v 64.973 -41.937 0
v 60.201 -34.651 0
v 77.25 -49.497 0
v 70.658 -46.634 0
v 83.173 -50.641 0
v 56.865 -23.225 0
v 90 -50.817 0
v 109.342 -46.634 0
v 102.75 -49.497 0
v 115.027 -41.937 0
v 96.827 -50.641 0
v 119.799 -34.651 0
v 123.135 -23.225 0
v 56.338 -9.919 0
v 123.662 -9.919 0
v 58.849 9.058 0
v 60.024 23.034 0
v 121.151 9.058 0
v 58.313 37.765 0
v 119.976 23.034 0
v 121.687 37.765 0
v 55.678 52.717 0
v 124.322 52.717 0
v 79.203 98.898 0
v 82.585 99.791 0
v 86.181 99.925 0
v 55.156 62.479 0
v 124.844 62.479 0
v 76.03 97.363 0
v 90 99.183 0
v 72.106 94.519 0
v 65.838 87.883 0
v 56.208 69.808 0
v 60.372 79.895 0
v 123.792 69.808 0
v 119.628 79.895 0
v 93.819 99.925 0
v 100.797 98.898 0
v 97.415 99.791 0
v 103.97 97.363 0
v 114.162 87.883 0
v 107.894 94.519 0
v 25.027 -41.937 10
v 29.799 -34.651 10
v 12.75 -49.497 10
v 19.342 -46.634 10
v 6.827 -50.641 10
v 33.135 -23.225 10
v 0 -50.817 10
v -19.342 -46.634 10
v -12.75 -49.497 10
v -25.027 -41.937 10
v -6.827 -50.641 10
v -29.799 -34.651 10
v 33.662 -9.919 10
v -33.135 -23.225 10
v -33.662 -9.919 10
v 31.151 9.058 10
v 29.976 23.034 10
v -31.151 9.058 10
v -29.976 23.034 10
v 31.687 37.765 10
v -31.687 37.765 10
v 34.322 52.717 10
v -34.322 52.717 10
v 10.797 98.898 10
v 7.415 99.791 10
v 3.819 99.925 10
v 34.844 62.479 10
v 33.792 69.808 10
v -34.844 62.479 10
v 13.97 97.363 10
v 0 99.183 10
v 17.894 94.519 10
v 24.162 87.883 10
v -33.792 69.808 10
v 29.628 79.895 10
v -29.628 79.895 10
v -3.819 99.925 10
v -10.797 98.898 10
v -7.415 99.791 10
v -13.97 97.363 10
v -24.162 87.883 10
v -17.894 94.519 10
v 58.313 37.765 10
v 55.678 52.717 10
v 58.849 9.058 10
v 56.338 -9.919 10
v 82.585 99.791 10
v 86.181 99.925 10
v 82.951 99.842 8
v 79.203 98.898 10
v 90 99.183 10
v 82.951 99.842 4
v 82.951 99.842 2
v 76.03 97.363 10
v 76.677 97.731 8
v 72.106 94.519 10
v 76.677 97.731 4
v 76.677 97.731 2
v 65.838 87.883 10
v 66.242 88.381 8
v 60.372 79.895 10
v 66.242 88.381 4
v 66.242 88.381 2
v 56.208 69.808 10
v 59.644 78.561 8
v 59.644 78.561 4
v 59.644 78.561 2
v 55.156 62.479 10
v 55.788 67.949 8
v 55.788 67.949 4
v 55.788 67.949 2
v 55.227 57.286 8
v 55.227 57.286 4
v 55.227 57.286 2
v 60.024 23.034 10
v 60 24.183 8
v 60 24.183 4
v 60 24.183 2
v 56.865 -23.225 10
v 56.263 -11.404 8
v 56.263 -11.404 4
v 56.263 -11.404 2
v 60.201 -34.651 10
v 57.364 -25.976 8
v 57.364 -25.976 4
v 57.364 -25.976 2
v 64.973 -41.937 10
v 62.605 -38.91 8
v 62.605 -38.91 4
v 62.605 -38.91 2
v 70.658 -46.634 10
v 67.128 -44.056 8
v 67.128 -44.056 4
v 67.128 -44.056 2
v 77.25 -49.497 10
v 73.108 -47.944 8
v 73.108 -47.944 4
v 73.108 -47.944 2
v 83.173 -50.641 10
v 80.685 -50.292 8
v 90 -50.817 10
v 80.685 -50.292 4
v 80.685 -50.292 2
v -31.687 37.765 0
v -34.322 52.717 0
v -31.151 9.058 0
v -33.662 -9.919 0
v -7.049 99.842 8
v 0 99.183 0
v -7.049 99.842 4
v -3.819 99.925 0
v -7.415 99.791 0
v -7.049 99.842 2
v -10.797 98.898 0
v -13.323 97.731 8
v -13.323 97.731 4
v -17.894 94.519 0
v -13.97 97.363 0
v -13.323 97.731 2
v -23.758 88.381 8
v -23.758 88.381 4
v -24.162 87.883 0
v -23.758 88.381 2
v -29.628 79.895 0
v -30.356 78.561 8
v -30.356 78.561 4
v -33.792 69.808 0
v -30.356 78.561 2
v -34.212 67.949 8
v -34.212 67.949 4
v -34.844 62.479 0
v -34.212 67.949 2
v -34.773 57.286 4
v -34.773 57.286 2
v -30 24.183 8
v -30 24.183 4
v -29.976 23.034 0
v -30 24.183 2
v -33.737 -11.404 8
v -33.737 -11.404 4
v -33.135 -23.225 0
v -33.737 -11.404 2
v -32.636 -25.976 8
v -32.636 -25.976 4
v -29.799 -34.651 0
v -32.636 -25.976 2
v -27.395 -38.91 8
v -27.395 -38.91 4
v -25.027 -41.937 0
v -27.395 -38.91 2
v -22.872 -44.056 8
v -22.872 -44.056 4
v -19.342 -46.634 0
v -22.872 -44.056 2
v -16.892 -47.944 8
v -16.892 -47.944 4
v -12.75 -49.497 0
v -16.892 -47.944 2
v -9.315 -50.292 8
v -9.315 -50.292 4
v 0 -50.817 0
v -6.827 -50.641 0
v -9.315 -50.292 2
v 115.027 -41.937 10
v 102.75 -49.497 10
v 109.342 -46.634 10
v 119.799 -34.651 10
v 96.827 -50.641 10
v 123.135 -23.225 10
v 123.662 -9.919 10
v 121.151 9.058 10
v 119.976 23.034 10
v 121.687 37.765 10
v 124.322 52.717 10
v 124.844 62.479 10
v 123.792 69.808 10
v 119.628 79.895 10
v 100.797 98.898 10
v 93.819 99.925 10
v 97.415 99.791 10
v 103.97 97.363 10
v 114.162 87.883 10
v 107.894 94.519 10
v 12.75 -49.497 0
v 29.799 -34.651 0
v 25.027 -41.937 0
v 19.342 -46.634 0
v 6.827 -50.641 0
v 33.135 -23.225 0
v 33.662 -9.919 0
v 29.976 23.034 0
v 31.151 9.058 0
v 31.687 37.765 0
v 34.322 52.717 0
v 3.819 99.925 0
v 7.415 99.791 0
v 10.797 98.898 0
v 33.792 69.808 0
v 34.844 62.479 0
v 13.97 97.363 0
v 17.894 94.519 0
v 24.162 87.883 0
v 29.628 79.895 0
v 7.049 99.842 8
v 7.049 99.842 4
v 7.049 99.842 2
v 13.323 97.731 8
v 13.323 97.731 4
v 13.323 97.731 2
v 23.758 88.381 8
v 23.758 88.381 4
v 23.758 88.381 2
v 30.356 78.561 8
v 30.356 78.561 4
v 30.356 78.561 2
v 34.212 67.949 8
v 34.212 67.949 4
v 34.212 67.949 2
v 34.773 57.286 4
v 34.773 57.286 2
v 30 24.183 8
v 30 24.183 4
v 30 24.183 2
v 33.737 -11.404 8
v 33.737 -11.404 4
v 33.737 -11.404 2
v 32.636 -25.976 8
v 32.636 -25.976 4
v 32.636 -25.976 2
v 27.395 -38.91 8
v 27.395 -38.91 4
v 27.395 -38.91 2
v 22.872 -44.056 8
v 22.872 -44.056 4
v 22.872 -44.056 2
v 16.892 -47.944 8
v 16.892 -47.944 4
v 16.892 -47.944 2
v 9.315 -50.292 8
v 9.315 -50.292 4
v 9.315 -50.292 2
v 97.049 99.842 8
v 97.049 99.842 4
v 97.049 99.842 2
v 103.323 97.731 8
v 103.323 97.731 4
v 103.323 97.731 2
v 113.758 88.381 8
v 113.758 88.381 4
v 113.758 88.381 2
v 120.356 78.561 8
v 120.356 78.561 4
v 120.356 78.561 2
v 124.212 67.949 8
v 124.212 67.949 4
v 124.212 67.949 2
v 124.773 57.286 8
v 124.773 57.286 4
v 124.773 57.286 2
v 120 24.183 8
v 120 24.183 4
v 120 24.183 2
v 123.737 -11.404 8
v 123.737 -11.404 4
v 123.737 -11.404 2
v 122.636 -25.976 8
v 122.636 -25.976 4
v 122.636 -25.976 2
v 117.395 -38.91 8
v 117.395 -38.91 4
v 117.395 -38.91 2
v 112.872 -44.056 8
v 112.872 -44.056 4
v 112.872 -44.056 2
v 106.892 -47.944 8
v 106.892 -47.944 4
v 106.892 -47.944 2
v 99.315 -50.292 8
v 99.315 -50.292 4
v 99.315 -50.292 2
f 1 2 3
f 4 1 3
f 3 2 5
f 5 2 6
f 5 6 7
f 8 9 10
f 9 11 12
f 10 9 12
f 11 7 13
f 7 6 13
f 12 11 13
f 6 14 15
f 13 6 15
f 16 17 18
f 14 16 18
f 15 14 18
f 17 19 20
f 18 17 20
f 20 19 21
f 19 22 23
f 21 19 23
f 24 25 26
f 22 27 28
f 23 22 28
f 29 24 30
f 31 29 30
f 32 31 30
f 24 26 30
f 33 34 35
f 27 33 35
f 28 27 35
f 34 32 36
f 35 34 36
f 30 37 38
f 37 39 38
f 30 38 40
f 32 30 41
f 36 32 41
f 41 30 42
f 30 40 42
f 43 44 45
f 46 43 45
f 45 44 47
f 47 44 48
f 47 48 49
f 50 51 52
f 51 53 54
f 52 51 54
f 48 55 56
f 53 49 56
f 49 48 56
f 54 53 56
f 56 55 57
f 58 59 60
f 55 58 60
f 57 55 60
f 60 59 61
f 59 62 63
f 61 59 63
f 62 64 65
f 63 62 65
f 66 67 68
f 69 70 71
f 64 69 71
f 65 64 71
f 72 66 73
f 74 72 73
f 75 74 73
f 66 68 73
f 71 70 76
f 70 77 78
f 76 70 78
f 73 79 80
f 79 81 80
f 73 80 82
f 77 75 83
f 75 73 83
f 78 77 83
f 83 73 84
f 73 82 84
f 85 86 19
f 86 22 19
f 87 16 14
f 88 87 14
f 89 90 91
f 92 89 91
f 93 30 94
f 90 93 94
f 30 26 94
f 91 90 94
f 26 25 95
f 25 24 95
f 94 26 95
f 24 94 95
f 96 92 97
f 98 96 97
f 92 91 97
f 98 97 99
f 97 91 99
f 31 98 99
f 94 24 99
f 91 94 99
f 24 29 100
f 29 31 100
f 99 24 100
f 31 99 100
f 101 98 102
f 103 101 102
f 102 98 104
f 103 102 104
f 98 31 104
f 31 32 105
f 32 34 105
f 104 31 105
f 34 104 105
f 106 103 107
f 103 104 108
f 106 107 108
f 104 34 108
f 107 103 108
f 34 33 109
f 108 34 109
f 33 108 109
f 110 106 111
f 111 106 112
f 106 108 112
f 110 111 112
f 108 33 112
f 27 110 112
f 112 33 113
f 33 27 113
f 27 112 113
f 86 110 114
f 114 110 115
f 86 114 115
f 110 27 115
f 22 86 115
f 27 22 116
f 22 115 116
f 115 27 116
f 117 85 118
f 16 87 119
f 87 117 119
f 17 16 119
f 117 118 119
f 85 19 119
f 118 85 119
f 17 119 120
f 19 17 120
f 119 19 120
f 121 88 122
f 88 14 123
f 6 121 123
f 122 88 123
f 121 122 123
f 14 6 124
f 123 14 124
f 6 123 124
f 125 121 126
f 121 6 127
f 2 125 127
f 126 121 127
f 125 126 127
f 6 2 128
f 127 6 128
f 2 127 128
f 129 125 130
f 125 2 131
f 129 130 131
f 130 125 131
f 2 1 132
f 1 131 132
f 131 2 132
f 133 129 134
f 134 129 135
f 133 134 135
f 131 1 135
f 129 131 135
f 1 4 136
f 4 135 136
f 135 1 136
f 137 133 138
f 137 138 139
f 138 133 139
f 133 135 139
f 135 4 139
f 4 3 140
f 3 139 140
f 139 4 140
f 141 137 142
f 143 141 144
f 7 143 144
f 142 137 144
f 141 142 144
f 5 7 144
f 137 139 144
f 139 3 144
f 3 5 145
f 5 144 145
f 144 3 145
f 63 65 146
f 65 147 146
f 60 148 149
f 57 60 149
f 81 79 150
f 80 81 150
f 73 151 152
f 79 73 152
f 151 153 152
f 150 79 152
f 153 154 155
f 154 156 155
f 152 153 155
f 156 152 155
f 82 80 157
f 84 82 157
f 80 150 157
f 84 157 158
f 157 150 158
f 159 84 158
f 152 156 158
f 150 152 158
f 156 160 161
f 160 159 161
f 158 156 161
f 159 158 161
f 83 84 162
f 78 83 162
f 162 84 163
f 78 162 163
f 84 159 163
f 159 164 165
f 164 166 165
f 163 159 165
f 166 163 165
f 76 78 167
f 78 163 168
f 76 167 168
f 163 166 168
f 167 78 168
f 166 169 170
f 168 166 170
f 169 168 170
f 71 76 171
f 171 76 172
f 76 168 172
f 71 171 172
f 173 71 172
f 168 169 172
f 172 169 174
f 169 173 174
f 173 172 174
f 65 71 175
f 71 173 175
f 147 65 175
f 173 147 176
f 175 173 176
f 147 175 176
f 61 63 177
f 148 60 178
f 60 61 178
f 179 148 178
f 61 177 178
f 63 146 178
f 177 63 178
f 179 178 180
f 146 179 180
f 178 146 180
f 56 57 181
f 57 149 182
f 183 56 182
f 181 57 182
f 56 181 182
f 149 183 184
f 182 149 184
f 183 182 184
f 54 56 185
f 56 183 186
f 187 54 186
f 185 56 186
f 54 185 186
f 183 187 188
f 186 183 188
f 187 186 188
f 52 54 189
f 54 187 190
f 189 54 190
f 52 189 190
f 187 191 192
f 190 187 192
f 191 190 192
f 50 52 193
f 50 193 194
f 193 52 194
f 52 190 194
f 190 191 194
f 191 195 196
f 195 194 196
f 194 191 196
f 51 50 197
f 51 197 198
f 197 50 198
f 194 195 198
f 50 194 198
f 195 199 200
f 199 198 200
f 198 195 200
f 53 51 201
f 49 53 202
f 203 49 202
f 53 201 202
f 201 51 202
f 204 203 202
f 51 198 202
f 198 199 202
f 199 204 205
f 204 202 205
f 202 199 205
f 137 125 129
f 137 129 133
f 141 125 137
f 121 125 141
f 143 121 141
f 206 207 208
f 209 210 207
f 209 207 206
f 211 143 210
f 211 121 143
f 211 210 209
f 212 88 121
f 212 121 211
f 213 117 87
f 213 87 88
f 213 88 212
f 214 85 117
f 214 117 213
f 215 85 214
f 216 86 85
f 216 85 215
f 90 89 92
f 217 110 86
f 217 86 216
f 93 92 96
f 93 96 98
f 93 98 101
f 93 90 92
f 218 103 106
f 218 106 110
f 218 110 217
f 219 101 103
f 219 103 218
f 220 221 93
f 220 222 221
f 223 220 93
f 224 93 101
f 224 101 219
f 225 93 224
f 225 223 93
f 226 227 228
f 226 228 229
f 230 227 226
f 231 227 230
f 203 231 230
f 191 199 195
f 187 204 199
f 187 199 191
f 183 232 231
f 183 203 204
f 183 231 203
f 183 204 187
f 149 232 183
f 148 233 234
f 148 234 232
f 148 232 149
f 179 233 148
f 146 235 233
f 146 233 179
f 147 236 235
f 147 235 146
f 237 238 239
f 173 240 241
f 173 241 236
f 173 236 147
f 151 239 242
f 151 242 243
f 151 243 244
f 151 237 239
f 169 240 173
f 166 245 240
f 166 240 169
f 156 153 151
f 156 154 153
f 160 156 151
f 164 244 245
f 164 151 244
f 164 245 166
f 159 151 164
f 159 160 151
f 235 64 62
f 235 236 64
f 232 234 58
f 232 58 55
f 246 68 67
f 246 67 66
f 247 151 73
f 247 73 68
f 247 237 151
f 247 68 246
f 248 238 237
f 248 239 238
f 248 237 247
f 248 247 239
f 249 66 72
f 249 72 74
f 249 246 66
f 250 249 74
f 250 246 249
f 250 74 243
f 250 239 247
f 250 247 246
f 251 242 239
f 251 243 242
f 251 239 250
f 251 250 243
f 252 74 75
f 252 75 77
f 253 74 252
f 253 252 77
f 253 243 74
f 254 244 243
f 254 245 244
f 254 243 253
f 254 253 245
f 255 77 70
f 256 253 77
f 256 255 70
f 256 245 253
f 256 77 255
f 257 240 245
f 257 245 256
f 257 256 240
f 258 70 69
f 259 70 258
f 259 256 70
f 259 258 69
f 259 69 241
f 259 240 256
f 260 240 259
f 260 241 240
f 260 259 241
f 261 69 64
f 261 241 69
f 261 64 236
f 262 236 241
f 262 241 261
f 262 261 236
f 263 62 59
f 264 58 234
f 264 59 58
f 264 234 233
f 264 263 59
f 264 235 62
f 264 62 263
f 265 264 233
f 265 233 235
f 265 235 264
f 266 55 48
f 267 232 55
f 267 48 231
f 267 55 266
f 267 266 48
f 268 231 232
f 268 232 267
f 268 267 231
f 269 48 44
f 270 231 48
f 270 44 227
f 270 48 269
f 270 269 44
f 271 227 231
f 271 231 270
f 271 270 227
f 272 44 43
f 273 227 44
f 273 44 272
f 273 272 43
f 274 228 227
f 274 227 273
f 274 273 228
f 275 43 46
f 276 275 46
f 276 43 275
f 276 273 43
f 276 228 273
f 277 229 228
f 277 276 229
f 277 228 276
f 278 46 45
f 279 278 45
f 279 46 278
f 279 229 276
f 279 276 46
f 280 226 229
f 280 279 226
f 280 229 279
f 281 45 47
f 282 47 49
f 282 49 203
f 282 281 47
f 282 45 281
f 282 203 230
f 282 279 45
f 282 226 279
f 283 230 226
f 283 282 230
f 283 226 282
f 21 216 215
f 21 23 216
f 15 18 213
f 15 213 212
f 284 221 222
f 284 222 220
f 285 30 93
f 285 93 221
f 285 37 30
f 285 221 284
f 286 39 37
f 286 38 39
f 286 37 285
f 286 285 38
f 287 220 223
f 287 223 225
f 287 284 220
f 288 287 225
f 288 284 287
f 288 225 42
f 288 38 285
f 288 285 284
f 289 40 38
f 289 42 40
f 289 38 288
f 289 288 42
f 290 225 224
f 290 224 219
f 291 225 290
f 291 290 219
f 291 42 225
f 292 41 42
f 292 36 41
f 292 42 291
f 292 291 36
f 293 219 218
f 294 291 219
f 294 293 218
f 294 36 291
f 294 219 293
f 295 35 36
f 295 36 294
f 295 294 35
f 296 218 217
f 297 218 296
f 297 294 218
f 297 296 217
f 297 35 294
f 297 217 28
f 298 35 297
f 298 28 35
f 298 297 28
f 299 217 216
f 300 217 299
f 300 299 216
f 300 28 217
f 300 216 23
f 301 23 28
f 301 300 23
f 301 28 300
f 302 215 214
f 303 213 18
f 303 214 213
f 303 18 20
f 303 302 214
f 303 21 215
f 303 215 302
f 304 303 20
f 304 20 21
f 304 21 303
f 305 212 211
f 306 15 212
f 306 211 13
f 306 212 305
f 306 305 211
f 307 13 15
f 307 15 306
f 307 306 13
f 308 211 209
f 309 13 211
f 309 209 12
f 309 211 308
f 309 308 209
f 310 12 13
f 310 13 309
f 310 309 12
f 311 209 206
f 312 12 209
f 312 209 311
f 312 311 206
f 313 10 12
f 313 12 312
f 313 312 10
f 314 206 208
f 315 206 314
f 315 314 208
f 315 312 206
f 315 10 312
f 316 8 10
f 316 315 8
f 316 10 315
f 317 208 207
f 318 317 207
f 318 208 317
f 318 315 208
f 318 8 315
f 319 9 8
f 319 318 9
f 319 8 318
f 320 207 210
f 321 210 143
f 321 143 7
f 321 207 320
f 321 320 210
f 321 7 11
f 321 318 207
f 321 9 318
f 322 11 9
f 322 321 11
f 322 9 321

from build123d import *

# Parameters (mm, degrees)
BOSS_EXTRUDE1_DEPTH = 10


with BuildPart() as part:
    # Sketch2 → Boss-Extrude1 (new body)
    with BuildSketch(Plane.XY):
        with BuildLine():
            add(Edge.make_bspline(
                [(0, 99.183285394), (9.940064442, 102.262299521), (24.122612265, 90.46414584), (40.33453266, 61.943212567), (25.180027607, 26.436288764), (39.04722634, -17.717188406), (27.280230095, -52.099061458), (0, -50.816714606)],
                knots=[0, 0, 0, 0, 0.146529274, 0.268876507, 0.503259797, 0.694010191, 1, 1, 1, 1], degree=3))
            add(Edge.make_bspline(
                [(0, 99.183285394), (-9.940064442, 102.262299521), (-24.122612265, 90.46414584), (-40.33453266, 61.943212567), (-25.180027607, 26.436288764), (-39.04722634, -17.717188406), (-27.280230095, -52.099061458), (0, -50.816714606)],
                knots=[0, 0, 0, 0, 0.146529274, 0.268876507, 0.503259797, 0.694010191, 1, 1, 1, 1], degree=3))
        make_face()
    extrude(amount=BOSS_EXTRUDE1_DEPTH)


with BuildPart() as body_2:
    # Mirror2: mirrored copy
    add(part.part.mirror(Plane(origin=(45, 0, 0), x_dir=(0, 0, 1), z_dir=(1, 0, 0))))


solid = Compound([part.part, body_2.part])
